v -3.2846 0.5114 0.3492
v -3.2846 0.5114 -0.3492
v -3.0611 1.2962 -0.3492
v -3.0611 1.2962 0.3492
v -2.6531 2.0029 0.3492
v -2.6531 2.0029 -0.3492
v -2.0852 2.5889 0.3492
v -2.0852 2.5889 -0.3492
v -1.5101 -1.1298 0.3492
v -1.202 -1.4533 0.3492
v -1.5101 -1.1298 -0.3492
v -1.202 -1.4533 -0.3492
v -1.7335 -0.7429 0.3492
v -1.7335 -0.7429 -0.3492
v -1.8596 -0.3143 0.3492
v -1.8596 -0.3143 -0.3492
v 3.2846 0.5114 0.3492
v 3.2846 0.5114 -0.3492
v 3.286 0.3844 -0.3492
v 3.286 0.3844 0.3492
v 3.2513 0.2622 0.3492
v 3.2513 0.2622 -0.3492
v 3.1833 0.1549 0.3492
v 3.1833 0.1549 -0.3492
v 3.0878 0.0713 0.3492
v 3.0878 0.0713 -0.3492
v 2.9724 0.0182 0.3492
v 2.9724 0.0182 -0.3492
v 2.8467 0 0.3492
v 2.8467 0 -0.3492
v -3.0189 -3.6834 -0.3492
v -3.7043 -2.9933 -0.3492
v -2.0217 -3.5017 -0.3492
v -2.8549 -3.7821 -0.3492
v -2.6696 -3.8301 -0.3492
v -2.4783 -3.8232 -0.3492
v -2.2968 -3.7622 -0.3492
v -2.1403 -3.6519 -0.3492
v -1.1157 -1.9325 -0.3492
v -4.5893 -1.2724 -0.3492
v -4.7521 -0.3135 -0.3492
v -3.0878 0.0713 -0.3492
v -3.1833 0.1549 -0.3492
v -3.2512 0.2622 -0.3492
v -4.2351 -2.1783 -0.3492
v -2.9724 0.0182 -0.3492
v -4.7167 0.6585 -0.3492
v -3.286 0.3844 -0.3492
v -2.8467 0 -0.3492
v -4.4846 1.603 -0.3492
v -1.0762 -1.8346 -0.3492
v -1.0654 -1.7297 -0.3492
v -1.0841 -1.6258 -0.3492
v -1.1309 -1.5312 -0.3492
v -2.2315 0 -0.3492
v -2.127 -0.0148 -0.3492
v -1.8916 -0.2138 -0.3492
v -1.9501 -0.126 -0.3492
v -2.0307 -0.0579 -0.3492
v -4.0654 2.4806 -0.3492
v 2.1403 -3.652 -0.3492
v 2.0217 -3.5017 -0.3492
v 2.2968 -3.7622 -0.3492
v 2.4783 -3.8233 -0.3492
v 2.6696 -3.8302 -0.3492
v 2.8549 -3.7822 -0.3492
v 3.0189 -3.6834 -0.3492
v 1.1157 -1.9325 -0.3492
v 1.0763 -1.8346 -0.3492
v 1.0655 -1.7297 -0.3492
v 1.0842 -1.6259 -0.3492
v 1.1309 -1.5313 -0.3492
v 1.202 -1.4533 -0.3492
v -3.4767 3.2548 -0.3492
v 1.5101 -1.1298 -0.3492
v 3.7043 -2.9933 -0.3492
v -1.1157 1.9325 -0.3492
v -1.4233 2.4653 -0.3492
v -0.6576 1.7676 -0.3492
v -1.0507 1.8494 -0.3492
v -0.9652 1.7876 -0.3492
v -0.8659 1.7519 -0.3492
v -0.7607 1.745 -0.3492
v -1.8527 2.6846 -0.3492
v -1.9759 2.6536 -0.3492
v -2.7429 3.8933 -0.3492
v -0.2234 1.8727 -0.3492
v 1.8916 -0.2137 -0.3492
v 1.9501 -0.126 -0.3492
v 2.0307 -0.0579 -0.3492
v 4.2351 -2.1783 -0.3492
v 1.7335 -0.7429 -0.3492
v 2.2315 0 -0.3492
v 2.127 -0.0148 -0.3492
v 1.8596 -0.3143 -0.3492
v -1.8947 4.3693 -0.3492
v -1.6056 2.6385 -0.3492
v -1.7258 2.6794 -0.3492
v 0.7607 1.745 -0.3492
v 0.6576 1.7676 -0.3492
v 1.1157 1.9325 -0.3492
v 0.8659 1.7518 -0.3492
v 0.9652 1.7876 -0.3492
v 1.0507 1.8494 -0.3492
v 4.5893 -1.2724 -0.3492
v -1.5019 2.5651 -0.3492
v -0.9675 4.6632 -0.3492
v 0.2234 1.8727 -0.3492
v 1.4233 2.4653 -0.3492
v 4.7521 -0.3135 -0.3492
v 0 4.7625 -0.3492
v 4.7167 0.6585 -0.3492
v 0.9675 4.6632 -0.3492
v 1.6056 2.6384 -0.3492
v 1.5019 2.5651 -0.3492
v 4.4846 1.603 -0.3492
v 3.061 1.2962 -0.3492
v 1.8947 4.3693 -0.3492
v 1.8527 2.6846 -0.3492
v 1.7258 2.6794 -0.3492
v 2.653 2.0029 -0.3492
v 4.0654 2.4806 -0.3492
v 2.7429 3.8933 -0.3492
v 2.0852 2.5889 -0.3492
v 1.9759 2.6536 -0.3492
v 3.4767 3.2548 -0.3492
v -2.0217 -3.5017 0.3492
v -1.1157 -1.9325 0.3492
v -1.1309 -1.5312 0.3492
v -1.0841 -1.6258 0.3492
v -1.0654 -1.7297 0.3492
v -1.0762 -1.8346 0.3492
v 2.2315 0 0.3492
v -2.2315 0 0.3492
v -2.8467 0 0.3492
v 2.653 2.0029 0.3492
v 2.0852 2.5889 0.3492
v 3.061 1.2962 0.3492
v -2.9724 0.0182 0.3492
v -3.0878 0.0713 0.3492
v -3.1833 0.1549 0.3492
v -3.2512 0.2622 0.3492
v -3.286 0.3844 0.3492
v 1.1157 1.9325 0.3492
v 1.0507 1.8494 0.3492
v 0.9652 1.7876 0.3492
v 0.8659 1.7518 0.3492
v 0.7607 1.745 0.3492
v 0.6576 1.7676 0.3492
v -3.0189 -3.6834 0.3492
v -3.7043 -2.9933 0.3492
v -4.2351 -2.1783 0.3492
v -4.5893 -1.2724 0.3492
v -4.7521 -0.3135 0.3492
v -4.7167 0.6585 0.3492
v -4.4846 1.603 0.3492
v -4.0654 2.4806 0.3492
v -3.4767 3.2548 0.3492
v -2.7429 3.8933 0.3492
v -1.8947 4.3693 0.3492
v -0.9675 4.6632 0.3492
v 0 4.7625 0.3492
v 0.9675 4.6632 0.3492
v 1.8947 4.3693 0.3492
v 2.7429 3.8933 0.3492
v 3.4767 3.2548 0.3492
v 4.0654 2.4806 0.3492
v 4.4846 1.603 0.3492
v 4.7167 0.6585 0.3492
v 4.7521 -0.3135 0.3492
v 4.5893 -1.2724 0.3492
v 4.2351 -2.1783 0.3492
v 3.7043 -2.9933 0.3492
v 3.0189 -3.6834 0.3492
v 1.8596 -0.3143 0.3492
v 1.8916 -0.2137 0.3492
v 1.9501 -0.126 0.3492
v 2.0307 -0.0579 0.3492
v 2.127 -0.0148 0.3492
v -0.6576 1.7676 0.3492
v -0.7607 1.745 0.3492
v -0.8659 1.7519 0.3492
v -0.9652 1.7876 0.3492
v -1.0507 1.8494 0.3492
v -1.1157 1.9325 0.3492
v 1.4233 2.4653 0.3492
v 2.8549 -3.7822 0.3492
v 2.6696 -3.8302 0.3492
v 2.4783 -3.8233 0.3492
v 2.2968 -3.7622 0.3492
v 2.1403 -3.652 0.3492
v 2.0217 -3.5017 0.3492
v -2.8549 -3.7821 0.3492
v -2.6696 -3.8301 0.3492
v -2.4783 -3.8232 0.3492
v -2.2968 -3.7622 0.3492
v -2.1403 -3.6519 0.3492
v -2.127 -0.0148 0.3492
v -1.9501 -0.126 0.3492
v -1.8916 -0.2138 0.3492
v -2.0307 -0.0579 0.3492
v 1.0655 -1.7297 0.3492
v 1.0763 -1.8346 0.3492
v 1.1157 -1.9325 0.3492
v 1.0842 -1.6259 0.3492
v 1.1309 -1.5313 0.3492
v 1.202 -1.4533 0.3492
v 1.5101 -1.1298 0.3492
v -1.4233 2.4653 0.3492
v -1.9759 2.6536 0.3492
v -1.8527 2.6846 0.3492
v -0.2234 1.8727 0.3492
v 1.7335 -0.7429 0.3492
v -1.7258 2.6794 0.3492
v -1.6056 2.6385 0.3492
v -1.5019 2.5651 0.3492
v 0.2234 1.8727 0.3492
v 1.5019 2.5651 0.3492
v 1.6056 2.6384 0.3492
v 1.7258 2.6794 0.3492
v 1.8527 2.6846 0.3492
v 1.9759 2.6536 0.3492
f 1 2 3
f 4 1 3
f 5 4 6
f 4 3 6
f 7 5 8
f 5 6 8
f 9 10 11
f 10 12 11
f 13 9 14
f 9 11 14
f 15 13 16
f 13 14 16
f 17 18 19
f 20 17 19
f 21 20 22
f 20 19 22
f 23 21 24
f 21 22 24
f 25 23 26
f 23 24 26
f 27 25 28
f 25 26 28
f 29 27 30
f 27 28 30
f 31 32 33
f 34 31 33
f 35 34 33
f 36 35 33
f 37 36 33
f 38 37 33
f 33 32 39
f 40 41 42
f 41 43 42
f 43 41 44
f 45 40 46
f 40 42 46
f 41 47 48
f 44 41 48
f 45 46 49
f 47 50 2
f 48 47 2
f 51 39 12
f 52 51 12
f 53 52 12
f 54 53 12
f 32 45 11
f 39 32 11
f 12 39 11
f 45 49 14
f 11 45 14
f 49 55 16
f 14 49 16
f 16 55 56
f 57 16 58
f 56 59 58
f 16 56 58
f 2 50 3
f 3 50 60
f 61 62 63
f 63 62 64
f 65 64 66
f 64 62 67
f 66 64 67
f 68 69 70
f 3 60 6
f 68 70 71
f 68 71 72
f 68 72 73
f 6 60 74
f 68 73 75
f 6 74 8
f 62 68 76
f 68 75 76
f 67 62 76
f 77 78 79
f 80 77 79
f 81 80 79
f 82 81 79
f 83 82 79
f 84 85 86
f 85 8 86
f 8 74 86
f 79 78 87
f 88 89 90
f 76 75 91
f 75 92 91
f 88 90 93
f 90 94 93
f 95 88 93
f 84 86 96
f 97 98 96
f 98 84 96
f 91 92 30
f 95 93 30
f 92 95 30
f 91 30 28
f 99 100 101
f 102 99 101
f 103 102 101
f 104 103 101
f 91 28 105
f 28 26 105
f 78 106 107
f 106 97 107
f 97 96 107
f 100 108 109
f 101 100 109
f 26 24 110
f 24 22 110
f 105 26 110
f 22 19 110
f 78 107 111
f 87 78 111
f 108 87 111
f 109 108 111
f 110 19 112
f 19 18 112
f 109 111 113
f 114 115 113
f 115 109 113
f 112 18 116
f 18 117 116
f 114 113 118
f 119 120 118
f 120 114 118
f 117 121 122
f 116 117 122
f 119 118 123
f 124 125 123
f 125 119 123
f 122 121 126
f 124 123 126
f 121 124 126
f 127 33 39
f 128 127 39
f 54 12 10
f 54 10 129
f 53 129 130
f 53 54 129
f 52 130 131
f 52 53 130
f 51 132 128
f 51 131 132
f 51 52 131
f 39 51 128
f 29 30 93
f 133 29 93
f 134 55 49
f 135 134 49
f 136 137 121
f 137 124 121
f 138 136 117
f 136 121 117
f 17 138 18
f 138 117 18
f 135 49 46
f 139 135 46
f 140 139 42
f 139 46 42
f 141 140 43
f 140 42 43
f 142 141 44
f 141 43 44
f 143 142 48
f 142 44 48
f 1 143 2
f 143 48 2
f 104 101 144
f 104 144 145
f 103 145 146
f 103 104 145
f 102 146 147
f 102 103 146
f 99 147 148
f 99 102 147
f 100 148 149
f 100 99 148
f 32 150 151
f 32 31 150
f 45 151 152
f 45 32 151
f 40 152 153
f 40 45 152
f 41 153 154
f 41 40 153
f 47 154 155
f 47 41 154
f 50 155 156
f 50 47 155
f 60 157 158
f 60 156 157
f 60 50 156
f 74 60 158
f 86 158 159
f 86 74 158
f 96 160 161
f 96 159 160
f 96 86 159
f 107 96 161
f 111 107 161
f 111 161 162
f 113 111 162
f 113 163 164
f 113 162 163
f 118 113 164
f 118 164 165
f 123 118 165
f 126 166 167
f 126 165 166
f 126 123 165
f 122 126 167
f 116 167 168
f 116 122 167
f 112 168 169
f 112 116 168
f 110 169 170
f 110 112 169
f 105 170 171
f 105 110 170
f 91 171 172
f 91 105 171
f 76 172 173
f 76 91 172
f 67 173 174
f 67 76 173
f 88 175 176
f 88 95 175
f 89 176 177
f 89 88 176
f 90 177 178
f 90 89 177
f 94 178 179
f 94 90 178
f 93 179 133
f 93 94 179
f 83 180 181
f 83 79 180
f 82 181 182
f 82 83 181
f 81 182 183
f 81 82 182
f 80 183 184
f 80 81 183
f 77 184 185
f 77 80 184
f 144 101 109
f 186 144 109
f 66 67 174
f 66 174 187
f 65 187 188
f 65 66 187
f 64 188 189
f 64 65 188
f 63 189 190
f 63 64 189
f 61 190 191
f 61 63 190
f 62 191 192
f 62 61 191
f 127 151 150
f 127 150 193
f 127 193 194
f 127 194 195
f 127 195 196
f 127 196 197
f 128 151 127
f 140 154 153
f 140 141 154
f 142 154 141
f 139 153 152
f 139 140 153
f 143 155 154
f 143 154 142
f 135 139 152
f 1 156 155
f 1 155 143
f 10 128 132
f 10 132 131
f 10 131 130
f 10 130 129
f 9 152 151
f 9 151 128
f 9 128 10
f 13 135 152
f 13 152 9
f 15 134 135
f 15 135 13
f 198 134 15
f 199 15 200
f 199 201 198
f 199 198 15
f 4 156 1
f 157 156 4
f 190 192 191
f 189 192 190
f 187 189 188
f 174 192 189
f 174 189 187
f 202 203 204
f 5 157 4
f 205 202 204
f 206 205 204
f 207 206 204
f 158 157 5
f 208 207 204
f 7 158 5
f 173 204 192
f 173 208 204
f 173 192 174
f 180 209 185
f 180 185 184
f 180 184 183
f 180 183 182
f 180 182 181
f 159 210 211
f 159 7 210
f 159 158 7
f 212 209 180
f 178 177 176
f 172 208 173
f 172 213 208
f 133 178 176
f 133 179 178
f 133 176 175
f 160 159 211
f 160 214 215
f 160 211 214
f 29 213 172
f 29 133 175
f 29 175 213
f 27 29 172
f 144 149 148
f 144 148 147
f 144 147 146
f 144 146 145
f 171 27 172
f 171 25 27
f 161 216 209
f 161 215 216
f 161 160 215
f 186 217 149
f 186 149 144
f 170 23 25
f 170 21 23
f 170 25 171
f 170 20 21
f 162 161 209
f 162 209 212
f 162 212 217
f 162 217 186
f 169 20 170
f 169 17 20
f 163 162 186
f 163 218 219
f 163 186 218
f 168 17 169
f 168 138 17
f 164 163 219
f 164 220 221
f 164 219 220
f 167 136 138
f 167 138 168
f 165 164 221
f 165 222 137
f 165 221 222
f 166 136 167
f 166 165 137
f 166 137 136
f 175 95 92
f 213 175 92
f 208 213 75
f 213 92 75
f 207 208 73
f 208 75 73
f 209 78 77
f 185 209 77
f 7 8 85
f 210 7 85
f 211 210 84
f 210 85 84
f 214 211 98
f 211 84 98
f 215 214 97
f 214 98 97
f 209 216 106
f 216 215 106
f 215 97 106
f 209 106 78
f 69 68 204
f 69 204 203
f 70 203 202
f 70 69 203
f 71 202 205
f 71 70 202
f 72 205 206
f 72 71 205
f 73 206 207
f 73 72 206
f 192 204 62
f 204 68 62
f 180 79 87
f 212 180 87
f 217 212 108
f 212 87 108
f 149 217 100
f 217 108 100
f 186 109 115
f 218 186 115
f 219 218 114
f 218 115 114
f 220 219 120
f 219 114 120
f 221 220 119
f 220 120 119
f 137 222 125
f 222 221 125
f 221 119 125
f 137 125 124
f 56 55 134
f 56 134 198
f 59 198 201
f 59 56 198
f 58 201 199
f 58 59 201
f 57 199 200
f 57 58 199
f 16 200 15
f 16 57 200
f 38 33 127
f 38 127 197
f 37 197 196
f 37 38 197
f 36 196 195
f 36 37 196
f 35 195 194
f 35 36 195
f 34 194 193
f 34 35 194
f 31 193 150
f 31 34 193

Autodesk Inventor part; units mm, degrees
sketch "Sketch_1" plane through (0, 0, 0) normal (0, 0, 1) x (1, 0, 0)
  arc A0 (3.0189, -3.6834) -> (-3.0189, -3.6834) centre (0, 0) ccw
  arc A1 (-3.0189, -3.6834) -> (-2.0217, -3.5017) centre (-2.5975, -3.1692) ccw
  line L0 (-2.0217, -3.5017) -> (-1.1157, -1.9325)
  arc A2 (-1.1157, -1.9325) -> (-1.202, -1.4533) centre (-1.4424, -1.7439) ccw
  arc A3 (-1.8596, -0.3143) -> (-1.202, -1.4533) centre (0, 0) ccw
  arc A4 (-1.8596, -0.3143) -> (-2.2315, 0) centre (-2.2315, -0.3772) ccw
  line L1 (-2.2315, 0) -> (-2.8467, 0)
  arc A5 (-3.2846, 0.5114) -> (-2.8467, 0) centre (-2.8467, 0.4432) ccw
  arc A6 (-2.0852, 2.5889) -> (-3.2846, 0.5114) centre (0, 0) ccw
  arc A7 (-1.4233, 2.4653) -> (-2.0852, 2.5889) centre (-1.8072, 2.2437) ccw
  line L2 (-1.4233, 2.4653) -> (-1.1157, 1.9325)
  arc A8 (-1.1157, 1.9325) -> (-0.6576, 1.7676) centre (-0.7891, 2.1211) ccw
  arc A9 (0.6576, 1.7676) -> (-0.6576, 1.7676) centre (0, 0) ccw
  arc A10 (0.6576, 1.7676) -> (1.1157, 1.9325) centre (0.7891, 2.1211) ccw
  line L3 (1.1157, 1.9325) -> (1.4233, 2.4653)
  arc A11 (2.0852, 2.5889) -> (1.4233, 2.4653) centre (1.8072, 2.2437) ccw
  arc A12 (3.2846, 0.5114) -> (2.0852, 2.5889) centre (0, 0) ccw
  arc A13 (2.8467, 0) -> (3.2846, 0.5114) centre (2.8467, 0.4432) ccw
  line L4 (2.8467, 0) -> (2.2315, 0)
  arc A14 (2.2315, 0) -> (1.8596, -0.3143) centre (2.2315, -0.3772) ccw
  arc A15 (1.202, -1.4533) -> (1.8596, -0.3143) centre (0, 0) ccw
  arc A16 (1.202, -1.4533) -> (1.1157, -1.9325) centre (1.4424, -1.7439) ccw
  line L5 (1.1157, -1.9325) -> (2.0217, -3.5017)
  arc A17 (2.0217, -3.5017) -> (3.0189, -3.6834) centre (2.5975, -3.1692) ccw
extrude "Extrusion1" add sketch "Sketch_1" along normal mid plane 0.6985
ref_plane "RR_XY" through (0, 0, 0) normal (0, 0, 1) x (1, 0, 0)
ref_plane "RR_YZ" through (0, 0, 0) normal (1, 0, 0) x (0, 1, 0)
ref_plane "RR_ZX" through (0, 0, 0) normal (0, 1, 0) x (0, 0, 1)
properties part number "D-5406"
